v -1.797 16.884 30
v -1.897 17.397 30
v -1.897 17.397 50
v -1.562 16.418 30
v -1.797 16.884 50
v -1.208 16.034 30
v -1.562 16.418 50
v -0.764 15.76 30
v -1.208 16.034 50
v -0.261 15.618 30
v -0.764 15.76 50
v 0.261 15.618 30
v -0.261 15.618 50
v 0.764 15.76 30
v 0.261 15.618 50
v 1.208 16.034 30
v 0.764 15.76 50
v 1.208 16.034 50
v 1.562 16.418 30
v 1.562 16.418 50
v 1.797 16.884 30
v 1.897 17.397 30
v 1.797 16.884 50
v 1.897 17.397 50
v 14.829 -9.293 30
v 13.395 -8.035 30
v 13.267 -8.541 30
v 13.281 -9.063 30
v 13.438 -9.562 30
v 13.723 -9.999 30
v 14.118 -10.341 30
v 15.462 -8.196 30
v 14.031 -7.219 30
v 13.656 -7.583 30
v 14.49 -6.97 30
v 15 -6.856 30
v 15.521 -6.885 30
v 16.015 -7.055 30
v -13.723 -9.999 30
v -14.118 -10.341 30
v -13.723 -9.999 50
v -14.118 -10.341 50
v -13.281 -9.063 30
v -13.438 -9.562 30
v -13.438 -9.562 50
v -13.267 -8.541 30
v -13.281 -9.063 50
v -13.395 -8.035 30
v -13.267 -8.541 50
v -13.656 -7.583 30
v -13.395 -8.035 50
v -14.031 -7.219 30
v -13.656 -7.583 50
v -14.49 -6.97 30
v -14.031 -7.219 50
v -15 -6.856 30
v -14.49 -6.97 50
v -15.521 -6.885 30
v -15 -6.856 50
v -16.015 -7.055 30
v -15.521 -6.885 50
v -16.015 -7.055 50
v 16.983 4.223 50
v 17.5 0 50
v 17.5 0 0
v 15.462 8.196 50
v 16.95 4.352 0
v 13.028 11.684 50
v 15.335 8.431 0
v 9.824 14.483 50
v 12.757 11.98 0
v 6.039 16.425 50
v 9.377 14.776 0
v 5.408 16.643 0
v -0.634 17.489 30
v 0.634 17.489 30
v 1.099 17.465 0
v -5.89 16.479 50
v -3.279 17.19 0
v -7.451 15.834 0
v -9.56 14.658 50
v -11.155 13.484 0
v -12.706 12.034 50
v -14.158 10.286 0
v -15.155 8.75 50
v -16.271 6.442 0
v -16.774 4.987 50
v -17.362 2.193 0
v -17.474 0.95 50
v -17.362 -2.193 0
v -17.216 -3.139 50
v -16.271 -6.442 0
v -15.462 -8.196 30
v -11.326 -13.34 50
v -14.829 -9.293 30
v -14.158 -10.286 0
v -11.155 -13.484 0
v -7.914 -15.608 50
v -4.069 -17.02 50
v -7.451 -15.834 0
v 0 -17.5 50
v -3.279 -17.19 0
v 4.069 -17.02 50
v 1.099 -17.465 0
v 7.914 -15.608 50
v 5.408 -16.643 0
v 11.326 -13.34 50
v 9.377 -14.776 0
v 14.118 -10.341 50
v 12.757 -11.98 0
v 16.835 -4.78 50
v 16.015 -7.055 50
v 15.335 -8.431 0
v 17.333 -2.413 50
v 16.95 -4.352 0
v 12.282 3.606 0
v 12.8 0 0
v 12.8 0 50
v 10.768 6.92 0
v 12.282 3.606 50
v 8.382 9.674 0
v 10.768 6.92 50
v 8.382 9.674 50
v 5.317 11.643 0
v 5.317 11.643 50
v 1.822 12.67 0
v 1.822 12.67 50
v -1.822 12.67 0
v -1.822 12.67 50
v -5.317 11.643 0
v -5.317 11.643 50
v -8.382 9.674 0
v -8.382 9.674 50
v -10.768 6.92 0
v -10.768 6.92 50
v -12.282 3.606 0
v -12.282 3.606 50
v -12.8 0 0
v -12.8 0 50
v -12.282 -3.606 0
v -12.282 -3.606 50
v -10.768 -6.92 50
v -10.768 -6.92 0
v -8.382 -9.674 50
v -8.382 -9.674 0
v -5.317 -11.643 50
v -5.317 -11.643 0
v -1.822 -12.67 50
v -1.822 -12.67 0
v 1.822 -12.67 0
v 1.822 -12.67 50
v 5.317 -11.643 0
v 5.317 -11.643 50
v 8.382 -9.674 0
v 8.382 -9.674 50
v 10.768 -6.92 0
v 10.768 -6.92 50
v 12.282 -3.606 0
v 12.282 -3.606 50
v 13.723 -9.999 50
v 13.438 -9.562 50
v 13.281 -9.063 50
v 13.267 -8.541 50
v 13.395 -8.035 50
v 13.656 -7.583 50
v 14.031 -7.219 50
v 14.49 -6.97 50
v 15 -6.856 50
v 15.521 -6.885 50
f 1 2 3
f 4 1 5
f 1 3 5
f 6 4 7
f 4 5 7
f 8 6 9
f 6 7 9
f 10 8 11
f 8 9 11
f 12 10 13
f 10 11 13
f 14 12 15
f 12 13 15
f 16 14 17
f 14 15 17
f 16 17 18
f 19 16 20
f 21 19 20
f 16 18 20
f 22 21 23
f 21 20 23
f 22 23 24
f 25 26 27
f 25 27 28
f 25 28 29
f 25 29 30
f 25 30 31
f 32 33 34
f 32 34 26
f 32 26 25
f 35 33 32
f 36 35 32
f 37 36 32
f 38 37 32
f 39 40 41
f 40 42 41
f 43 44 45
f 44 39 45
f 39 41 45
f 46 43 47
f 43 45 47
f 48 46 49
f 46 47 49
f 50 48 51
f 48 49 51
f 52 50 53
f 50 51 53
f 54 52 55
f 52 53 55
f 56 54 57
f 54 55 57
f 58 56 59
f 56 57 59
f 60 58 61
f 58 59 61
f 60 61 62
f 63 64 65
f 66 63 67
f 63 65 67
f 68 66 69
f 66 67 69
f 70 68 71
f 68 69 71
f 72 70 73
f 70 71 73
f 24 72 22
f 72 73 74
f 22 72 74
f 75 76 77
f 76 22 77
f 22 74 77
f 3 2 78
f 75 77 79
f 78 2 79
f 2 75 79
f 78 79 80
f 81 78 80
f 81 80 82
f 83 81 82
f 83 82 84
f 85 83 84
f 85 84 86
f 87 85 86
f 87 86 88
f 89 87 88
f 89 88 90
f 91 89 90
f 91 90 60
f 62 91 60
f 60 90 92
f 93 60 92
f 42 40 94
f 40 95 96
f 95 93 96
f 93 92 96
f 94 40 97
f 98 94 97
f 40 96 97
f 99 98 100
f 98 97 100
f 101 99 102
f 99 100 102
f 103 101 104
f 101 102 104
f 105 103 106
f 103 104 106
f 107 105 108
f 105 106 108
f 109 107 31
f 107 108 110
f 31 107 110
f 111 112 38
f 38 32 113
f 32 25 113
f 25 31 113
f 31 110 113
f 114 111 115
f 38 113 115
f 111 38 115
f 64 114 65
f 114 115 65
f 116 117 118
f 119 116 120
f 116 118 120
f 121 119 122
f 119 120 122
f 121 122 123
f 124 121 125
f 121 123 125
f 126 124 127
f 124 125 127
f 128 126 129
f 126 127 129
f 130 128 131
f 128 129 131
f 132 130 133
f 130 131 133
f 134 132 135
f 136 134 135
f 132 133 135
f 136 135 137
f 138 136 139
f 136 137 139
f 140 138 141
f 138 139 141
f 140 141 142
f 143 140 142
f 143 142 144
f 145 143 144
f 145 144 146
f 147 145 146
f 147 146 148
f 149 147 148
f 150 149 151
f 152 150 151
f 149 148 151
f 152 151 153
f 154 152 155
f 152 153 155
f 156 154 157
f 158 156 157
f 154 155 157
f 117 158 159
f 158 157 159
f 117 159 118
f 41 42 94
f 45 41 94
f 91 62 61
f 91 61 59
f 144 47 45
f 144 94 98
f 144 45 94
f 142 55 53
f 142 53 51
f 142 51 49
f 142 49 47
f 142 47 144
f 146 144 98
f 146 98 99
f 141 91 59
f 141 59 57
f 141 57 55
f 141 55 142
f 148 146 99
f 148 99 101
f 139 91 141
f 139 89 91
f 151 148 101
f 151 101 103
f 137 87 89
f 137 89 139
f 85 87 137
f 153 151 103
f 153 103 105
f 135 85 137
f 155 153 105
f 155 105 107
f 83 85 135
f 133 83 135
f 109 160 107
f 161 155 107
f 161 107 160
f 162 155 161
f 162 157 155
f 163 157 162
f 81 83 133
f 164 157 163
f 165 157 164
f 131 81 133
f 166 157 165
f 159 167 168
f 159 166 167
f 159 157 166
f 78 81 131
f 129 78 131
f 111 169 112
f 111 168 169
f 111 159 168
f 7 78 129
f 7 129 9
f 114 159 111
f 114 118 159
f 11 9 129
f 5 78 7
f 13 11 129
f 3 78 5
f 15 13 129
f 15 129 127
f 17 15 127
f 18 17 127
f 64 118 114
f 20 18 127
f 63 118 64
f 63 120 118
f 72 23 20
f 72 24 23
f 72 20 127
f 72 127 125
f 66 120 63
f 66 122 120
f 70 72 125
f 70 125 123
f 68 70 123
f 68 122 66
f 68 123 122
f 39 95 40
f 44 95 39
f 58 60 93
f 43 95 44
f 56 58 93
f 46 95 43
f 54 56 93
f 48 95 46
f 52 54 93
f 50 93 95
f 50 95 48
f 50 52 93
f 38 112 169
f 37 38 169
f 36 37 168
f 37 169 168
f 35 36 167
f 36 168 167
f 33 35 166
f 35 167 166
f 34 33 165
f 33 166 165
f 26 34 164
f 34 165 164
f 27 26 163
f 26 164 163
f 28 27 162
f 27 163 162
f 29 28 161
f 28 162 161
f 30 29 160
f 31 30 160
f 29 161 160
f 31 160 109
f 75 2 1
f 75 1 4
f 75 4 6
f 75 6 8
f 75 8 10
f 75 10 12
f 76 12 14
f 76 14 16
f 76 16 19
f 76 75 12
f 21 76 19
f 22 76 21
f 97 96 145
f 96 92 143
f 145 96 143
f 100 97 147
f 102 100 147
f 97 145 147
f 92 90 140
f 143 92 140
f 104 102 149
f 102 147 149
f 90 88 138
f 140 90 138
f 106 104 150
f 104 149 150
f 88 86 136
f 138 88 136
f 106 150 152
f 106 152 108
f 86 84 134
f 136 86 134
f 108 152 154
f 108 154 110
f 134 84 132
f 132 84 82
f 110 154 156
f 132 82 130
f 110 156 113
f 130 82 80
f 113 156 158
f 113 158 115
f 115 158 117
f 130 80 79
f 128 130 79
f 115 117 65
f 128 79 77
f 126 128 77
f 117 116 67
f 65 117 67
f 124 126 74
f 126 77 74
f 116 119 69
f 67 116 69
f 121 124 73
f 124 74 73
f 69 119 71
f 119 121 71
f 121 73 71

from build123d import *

# Parameters (mm, degrees)
ESQUISSE1_R             = 17.5
BOSS_EXTRU_1_DEPTH      = 50
ESQUISSE4_R             = 12.8
ENL_V_MAT_EXTRU_1_DEPTH = 50
ESQUISSE5_R             = 1.9
ENL_V_MAT_EXTRU_2_DEPTH = 20


with BuildPart() as part:
    # Esquisse1 → Boss.-Extru.1 (new body)
    with BuildSketch(Plane.XY):
        Circle(ESQUISSE1_R)
    extrude(amount=BOSS_EXTRU_1_DEPTH)

    # Esquisse4 → Enlèv. mat.-Extru.1 (cut)
    with BuildSketch(Plane.XY.offset(50)):
        Circle(ESQUISSE4_R)
    extrude(amount=-ENL_V_MAT_EXTRU_1_DEPTH, mode=Mode.SUBTRACT)

    # Esquisse5 → Enlèv. mat.-Extru.2 (cut)
    with BuildSketch(Plane.XY.offset(50)):
        with Locations((0, 17.5)):
            Circle(ESQUISSE5_R)
        with Locations((15.155444566, -8.75)):
            Circle(ESQUISSE5_R)
        with Locations((-15.155444566, -8.75)):
            Circle(ESQUISSE5_R)
    extrude(amount=-ENL_V_MAT_EXTRU_2_DEPTH, mode=Mode.SUBTRACT)


solid = part.part
